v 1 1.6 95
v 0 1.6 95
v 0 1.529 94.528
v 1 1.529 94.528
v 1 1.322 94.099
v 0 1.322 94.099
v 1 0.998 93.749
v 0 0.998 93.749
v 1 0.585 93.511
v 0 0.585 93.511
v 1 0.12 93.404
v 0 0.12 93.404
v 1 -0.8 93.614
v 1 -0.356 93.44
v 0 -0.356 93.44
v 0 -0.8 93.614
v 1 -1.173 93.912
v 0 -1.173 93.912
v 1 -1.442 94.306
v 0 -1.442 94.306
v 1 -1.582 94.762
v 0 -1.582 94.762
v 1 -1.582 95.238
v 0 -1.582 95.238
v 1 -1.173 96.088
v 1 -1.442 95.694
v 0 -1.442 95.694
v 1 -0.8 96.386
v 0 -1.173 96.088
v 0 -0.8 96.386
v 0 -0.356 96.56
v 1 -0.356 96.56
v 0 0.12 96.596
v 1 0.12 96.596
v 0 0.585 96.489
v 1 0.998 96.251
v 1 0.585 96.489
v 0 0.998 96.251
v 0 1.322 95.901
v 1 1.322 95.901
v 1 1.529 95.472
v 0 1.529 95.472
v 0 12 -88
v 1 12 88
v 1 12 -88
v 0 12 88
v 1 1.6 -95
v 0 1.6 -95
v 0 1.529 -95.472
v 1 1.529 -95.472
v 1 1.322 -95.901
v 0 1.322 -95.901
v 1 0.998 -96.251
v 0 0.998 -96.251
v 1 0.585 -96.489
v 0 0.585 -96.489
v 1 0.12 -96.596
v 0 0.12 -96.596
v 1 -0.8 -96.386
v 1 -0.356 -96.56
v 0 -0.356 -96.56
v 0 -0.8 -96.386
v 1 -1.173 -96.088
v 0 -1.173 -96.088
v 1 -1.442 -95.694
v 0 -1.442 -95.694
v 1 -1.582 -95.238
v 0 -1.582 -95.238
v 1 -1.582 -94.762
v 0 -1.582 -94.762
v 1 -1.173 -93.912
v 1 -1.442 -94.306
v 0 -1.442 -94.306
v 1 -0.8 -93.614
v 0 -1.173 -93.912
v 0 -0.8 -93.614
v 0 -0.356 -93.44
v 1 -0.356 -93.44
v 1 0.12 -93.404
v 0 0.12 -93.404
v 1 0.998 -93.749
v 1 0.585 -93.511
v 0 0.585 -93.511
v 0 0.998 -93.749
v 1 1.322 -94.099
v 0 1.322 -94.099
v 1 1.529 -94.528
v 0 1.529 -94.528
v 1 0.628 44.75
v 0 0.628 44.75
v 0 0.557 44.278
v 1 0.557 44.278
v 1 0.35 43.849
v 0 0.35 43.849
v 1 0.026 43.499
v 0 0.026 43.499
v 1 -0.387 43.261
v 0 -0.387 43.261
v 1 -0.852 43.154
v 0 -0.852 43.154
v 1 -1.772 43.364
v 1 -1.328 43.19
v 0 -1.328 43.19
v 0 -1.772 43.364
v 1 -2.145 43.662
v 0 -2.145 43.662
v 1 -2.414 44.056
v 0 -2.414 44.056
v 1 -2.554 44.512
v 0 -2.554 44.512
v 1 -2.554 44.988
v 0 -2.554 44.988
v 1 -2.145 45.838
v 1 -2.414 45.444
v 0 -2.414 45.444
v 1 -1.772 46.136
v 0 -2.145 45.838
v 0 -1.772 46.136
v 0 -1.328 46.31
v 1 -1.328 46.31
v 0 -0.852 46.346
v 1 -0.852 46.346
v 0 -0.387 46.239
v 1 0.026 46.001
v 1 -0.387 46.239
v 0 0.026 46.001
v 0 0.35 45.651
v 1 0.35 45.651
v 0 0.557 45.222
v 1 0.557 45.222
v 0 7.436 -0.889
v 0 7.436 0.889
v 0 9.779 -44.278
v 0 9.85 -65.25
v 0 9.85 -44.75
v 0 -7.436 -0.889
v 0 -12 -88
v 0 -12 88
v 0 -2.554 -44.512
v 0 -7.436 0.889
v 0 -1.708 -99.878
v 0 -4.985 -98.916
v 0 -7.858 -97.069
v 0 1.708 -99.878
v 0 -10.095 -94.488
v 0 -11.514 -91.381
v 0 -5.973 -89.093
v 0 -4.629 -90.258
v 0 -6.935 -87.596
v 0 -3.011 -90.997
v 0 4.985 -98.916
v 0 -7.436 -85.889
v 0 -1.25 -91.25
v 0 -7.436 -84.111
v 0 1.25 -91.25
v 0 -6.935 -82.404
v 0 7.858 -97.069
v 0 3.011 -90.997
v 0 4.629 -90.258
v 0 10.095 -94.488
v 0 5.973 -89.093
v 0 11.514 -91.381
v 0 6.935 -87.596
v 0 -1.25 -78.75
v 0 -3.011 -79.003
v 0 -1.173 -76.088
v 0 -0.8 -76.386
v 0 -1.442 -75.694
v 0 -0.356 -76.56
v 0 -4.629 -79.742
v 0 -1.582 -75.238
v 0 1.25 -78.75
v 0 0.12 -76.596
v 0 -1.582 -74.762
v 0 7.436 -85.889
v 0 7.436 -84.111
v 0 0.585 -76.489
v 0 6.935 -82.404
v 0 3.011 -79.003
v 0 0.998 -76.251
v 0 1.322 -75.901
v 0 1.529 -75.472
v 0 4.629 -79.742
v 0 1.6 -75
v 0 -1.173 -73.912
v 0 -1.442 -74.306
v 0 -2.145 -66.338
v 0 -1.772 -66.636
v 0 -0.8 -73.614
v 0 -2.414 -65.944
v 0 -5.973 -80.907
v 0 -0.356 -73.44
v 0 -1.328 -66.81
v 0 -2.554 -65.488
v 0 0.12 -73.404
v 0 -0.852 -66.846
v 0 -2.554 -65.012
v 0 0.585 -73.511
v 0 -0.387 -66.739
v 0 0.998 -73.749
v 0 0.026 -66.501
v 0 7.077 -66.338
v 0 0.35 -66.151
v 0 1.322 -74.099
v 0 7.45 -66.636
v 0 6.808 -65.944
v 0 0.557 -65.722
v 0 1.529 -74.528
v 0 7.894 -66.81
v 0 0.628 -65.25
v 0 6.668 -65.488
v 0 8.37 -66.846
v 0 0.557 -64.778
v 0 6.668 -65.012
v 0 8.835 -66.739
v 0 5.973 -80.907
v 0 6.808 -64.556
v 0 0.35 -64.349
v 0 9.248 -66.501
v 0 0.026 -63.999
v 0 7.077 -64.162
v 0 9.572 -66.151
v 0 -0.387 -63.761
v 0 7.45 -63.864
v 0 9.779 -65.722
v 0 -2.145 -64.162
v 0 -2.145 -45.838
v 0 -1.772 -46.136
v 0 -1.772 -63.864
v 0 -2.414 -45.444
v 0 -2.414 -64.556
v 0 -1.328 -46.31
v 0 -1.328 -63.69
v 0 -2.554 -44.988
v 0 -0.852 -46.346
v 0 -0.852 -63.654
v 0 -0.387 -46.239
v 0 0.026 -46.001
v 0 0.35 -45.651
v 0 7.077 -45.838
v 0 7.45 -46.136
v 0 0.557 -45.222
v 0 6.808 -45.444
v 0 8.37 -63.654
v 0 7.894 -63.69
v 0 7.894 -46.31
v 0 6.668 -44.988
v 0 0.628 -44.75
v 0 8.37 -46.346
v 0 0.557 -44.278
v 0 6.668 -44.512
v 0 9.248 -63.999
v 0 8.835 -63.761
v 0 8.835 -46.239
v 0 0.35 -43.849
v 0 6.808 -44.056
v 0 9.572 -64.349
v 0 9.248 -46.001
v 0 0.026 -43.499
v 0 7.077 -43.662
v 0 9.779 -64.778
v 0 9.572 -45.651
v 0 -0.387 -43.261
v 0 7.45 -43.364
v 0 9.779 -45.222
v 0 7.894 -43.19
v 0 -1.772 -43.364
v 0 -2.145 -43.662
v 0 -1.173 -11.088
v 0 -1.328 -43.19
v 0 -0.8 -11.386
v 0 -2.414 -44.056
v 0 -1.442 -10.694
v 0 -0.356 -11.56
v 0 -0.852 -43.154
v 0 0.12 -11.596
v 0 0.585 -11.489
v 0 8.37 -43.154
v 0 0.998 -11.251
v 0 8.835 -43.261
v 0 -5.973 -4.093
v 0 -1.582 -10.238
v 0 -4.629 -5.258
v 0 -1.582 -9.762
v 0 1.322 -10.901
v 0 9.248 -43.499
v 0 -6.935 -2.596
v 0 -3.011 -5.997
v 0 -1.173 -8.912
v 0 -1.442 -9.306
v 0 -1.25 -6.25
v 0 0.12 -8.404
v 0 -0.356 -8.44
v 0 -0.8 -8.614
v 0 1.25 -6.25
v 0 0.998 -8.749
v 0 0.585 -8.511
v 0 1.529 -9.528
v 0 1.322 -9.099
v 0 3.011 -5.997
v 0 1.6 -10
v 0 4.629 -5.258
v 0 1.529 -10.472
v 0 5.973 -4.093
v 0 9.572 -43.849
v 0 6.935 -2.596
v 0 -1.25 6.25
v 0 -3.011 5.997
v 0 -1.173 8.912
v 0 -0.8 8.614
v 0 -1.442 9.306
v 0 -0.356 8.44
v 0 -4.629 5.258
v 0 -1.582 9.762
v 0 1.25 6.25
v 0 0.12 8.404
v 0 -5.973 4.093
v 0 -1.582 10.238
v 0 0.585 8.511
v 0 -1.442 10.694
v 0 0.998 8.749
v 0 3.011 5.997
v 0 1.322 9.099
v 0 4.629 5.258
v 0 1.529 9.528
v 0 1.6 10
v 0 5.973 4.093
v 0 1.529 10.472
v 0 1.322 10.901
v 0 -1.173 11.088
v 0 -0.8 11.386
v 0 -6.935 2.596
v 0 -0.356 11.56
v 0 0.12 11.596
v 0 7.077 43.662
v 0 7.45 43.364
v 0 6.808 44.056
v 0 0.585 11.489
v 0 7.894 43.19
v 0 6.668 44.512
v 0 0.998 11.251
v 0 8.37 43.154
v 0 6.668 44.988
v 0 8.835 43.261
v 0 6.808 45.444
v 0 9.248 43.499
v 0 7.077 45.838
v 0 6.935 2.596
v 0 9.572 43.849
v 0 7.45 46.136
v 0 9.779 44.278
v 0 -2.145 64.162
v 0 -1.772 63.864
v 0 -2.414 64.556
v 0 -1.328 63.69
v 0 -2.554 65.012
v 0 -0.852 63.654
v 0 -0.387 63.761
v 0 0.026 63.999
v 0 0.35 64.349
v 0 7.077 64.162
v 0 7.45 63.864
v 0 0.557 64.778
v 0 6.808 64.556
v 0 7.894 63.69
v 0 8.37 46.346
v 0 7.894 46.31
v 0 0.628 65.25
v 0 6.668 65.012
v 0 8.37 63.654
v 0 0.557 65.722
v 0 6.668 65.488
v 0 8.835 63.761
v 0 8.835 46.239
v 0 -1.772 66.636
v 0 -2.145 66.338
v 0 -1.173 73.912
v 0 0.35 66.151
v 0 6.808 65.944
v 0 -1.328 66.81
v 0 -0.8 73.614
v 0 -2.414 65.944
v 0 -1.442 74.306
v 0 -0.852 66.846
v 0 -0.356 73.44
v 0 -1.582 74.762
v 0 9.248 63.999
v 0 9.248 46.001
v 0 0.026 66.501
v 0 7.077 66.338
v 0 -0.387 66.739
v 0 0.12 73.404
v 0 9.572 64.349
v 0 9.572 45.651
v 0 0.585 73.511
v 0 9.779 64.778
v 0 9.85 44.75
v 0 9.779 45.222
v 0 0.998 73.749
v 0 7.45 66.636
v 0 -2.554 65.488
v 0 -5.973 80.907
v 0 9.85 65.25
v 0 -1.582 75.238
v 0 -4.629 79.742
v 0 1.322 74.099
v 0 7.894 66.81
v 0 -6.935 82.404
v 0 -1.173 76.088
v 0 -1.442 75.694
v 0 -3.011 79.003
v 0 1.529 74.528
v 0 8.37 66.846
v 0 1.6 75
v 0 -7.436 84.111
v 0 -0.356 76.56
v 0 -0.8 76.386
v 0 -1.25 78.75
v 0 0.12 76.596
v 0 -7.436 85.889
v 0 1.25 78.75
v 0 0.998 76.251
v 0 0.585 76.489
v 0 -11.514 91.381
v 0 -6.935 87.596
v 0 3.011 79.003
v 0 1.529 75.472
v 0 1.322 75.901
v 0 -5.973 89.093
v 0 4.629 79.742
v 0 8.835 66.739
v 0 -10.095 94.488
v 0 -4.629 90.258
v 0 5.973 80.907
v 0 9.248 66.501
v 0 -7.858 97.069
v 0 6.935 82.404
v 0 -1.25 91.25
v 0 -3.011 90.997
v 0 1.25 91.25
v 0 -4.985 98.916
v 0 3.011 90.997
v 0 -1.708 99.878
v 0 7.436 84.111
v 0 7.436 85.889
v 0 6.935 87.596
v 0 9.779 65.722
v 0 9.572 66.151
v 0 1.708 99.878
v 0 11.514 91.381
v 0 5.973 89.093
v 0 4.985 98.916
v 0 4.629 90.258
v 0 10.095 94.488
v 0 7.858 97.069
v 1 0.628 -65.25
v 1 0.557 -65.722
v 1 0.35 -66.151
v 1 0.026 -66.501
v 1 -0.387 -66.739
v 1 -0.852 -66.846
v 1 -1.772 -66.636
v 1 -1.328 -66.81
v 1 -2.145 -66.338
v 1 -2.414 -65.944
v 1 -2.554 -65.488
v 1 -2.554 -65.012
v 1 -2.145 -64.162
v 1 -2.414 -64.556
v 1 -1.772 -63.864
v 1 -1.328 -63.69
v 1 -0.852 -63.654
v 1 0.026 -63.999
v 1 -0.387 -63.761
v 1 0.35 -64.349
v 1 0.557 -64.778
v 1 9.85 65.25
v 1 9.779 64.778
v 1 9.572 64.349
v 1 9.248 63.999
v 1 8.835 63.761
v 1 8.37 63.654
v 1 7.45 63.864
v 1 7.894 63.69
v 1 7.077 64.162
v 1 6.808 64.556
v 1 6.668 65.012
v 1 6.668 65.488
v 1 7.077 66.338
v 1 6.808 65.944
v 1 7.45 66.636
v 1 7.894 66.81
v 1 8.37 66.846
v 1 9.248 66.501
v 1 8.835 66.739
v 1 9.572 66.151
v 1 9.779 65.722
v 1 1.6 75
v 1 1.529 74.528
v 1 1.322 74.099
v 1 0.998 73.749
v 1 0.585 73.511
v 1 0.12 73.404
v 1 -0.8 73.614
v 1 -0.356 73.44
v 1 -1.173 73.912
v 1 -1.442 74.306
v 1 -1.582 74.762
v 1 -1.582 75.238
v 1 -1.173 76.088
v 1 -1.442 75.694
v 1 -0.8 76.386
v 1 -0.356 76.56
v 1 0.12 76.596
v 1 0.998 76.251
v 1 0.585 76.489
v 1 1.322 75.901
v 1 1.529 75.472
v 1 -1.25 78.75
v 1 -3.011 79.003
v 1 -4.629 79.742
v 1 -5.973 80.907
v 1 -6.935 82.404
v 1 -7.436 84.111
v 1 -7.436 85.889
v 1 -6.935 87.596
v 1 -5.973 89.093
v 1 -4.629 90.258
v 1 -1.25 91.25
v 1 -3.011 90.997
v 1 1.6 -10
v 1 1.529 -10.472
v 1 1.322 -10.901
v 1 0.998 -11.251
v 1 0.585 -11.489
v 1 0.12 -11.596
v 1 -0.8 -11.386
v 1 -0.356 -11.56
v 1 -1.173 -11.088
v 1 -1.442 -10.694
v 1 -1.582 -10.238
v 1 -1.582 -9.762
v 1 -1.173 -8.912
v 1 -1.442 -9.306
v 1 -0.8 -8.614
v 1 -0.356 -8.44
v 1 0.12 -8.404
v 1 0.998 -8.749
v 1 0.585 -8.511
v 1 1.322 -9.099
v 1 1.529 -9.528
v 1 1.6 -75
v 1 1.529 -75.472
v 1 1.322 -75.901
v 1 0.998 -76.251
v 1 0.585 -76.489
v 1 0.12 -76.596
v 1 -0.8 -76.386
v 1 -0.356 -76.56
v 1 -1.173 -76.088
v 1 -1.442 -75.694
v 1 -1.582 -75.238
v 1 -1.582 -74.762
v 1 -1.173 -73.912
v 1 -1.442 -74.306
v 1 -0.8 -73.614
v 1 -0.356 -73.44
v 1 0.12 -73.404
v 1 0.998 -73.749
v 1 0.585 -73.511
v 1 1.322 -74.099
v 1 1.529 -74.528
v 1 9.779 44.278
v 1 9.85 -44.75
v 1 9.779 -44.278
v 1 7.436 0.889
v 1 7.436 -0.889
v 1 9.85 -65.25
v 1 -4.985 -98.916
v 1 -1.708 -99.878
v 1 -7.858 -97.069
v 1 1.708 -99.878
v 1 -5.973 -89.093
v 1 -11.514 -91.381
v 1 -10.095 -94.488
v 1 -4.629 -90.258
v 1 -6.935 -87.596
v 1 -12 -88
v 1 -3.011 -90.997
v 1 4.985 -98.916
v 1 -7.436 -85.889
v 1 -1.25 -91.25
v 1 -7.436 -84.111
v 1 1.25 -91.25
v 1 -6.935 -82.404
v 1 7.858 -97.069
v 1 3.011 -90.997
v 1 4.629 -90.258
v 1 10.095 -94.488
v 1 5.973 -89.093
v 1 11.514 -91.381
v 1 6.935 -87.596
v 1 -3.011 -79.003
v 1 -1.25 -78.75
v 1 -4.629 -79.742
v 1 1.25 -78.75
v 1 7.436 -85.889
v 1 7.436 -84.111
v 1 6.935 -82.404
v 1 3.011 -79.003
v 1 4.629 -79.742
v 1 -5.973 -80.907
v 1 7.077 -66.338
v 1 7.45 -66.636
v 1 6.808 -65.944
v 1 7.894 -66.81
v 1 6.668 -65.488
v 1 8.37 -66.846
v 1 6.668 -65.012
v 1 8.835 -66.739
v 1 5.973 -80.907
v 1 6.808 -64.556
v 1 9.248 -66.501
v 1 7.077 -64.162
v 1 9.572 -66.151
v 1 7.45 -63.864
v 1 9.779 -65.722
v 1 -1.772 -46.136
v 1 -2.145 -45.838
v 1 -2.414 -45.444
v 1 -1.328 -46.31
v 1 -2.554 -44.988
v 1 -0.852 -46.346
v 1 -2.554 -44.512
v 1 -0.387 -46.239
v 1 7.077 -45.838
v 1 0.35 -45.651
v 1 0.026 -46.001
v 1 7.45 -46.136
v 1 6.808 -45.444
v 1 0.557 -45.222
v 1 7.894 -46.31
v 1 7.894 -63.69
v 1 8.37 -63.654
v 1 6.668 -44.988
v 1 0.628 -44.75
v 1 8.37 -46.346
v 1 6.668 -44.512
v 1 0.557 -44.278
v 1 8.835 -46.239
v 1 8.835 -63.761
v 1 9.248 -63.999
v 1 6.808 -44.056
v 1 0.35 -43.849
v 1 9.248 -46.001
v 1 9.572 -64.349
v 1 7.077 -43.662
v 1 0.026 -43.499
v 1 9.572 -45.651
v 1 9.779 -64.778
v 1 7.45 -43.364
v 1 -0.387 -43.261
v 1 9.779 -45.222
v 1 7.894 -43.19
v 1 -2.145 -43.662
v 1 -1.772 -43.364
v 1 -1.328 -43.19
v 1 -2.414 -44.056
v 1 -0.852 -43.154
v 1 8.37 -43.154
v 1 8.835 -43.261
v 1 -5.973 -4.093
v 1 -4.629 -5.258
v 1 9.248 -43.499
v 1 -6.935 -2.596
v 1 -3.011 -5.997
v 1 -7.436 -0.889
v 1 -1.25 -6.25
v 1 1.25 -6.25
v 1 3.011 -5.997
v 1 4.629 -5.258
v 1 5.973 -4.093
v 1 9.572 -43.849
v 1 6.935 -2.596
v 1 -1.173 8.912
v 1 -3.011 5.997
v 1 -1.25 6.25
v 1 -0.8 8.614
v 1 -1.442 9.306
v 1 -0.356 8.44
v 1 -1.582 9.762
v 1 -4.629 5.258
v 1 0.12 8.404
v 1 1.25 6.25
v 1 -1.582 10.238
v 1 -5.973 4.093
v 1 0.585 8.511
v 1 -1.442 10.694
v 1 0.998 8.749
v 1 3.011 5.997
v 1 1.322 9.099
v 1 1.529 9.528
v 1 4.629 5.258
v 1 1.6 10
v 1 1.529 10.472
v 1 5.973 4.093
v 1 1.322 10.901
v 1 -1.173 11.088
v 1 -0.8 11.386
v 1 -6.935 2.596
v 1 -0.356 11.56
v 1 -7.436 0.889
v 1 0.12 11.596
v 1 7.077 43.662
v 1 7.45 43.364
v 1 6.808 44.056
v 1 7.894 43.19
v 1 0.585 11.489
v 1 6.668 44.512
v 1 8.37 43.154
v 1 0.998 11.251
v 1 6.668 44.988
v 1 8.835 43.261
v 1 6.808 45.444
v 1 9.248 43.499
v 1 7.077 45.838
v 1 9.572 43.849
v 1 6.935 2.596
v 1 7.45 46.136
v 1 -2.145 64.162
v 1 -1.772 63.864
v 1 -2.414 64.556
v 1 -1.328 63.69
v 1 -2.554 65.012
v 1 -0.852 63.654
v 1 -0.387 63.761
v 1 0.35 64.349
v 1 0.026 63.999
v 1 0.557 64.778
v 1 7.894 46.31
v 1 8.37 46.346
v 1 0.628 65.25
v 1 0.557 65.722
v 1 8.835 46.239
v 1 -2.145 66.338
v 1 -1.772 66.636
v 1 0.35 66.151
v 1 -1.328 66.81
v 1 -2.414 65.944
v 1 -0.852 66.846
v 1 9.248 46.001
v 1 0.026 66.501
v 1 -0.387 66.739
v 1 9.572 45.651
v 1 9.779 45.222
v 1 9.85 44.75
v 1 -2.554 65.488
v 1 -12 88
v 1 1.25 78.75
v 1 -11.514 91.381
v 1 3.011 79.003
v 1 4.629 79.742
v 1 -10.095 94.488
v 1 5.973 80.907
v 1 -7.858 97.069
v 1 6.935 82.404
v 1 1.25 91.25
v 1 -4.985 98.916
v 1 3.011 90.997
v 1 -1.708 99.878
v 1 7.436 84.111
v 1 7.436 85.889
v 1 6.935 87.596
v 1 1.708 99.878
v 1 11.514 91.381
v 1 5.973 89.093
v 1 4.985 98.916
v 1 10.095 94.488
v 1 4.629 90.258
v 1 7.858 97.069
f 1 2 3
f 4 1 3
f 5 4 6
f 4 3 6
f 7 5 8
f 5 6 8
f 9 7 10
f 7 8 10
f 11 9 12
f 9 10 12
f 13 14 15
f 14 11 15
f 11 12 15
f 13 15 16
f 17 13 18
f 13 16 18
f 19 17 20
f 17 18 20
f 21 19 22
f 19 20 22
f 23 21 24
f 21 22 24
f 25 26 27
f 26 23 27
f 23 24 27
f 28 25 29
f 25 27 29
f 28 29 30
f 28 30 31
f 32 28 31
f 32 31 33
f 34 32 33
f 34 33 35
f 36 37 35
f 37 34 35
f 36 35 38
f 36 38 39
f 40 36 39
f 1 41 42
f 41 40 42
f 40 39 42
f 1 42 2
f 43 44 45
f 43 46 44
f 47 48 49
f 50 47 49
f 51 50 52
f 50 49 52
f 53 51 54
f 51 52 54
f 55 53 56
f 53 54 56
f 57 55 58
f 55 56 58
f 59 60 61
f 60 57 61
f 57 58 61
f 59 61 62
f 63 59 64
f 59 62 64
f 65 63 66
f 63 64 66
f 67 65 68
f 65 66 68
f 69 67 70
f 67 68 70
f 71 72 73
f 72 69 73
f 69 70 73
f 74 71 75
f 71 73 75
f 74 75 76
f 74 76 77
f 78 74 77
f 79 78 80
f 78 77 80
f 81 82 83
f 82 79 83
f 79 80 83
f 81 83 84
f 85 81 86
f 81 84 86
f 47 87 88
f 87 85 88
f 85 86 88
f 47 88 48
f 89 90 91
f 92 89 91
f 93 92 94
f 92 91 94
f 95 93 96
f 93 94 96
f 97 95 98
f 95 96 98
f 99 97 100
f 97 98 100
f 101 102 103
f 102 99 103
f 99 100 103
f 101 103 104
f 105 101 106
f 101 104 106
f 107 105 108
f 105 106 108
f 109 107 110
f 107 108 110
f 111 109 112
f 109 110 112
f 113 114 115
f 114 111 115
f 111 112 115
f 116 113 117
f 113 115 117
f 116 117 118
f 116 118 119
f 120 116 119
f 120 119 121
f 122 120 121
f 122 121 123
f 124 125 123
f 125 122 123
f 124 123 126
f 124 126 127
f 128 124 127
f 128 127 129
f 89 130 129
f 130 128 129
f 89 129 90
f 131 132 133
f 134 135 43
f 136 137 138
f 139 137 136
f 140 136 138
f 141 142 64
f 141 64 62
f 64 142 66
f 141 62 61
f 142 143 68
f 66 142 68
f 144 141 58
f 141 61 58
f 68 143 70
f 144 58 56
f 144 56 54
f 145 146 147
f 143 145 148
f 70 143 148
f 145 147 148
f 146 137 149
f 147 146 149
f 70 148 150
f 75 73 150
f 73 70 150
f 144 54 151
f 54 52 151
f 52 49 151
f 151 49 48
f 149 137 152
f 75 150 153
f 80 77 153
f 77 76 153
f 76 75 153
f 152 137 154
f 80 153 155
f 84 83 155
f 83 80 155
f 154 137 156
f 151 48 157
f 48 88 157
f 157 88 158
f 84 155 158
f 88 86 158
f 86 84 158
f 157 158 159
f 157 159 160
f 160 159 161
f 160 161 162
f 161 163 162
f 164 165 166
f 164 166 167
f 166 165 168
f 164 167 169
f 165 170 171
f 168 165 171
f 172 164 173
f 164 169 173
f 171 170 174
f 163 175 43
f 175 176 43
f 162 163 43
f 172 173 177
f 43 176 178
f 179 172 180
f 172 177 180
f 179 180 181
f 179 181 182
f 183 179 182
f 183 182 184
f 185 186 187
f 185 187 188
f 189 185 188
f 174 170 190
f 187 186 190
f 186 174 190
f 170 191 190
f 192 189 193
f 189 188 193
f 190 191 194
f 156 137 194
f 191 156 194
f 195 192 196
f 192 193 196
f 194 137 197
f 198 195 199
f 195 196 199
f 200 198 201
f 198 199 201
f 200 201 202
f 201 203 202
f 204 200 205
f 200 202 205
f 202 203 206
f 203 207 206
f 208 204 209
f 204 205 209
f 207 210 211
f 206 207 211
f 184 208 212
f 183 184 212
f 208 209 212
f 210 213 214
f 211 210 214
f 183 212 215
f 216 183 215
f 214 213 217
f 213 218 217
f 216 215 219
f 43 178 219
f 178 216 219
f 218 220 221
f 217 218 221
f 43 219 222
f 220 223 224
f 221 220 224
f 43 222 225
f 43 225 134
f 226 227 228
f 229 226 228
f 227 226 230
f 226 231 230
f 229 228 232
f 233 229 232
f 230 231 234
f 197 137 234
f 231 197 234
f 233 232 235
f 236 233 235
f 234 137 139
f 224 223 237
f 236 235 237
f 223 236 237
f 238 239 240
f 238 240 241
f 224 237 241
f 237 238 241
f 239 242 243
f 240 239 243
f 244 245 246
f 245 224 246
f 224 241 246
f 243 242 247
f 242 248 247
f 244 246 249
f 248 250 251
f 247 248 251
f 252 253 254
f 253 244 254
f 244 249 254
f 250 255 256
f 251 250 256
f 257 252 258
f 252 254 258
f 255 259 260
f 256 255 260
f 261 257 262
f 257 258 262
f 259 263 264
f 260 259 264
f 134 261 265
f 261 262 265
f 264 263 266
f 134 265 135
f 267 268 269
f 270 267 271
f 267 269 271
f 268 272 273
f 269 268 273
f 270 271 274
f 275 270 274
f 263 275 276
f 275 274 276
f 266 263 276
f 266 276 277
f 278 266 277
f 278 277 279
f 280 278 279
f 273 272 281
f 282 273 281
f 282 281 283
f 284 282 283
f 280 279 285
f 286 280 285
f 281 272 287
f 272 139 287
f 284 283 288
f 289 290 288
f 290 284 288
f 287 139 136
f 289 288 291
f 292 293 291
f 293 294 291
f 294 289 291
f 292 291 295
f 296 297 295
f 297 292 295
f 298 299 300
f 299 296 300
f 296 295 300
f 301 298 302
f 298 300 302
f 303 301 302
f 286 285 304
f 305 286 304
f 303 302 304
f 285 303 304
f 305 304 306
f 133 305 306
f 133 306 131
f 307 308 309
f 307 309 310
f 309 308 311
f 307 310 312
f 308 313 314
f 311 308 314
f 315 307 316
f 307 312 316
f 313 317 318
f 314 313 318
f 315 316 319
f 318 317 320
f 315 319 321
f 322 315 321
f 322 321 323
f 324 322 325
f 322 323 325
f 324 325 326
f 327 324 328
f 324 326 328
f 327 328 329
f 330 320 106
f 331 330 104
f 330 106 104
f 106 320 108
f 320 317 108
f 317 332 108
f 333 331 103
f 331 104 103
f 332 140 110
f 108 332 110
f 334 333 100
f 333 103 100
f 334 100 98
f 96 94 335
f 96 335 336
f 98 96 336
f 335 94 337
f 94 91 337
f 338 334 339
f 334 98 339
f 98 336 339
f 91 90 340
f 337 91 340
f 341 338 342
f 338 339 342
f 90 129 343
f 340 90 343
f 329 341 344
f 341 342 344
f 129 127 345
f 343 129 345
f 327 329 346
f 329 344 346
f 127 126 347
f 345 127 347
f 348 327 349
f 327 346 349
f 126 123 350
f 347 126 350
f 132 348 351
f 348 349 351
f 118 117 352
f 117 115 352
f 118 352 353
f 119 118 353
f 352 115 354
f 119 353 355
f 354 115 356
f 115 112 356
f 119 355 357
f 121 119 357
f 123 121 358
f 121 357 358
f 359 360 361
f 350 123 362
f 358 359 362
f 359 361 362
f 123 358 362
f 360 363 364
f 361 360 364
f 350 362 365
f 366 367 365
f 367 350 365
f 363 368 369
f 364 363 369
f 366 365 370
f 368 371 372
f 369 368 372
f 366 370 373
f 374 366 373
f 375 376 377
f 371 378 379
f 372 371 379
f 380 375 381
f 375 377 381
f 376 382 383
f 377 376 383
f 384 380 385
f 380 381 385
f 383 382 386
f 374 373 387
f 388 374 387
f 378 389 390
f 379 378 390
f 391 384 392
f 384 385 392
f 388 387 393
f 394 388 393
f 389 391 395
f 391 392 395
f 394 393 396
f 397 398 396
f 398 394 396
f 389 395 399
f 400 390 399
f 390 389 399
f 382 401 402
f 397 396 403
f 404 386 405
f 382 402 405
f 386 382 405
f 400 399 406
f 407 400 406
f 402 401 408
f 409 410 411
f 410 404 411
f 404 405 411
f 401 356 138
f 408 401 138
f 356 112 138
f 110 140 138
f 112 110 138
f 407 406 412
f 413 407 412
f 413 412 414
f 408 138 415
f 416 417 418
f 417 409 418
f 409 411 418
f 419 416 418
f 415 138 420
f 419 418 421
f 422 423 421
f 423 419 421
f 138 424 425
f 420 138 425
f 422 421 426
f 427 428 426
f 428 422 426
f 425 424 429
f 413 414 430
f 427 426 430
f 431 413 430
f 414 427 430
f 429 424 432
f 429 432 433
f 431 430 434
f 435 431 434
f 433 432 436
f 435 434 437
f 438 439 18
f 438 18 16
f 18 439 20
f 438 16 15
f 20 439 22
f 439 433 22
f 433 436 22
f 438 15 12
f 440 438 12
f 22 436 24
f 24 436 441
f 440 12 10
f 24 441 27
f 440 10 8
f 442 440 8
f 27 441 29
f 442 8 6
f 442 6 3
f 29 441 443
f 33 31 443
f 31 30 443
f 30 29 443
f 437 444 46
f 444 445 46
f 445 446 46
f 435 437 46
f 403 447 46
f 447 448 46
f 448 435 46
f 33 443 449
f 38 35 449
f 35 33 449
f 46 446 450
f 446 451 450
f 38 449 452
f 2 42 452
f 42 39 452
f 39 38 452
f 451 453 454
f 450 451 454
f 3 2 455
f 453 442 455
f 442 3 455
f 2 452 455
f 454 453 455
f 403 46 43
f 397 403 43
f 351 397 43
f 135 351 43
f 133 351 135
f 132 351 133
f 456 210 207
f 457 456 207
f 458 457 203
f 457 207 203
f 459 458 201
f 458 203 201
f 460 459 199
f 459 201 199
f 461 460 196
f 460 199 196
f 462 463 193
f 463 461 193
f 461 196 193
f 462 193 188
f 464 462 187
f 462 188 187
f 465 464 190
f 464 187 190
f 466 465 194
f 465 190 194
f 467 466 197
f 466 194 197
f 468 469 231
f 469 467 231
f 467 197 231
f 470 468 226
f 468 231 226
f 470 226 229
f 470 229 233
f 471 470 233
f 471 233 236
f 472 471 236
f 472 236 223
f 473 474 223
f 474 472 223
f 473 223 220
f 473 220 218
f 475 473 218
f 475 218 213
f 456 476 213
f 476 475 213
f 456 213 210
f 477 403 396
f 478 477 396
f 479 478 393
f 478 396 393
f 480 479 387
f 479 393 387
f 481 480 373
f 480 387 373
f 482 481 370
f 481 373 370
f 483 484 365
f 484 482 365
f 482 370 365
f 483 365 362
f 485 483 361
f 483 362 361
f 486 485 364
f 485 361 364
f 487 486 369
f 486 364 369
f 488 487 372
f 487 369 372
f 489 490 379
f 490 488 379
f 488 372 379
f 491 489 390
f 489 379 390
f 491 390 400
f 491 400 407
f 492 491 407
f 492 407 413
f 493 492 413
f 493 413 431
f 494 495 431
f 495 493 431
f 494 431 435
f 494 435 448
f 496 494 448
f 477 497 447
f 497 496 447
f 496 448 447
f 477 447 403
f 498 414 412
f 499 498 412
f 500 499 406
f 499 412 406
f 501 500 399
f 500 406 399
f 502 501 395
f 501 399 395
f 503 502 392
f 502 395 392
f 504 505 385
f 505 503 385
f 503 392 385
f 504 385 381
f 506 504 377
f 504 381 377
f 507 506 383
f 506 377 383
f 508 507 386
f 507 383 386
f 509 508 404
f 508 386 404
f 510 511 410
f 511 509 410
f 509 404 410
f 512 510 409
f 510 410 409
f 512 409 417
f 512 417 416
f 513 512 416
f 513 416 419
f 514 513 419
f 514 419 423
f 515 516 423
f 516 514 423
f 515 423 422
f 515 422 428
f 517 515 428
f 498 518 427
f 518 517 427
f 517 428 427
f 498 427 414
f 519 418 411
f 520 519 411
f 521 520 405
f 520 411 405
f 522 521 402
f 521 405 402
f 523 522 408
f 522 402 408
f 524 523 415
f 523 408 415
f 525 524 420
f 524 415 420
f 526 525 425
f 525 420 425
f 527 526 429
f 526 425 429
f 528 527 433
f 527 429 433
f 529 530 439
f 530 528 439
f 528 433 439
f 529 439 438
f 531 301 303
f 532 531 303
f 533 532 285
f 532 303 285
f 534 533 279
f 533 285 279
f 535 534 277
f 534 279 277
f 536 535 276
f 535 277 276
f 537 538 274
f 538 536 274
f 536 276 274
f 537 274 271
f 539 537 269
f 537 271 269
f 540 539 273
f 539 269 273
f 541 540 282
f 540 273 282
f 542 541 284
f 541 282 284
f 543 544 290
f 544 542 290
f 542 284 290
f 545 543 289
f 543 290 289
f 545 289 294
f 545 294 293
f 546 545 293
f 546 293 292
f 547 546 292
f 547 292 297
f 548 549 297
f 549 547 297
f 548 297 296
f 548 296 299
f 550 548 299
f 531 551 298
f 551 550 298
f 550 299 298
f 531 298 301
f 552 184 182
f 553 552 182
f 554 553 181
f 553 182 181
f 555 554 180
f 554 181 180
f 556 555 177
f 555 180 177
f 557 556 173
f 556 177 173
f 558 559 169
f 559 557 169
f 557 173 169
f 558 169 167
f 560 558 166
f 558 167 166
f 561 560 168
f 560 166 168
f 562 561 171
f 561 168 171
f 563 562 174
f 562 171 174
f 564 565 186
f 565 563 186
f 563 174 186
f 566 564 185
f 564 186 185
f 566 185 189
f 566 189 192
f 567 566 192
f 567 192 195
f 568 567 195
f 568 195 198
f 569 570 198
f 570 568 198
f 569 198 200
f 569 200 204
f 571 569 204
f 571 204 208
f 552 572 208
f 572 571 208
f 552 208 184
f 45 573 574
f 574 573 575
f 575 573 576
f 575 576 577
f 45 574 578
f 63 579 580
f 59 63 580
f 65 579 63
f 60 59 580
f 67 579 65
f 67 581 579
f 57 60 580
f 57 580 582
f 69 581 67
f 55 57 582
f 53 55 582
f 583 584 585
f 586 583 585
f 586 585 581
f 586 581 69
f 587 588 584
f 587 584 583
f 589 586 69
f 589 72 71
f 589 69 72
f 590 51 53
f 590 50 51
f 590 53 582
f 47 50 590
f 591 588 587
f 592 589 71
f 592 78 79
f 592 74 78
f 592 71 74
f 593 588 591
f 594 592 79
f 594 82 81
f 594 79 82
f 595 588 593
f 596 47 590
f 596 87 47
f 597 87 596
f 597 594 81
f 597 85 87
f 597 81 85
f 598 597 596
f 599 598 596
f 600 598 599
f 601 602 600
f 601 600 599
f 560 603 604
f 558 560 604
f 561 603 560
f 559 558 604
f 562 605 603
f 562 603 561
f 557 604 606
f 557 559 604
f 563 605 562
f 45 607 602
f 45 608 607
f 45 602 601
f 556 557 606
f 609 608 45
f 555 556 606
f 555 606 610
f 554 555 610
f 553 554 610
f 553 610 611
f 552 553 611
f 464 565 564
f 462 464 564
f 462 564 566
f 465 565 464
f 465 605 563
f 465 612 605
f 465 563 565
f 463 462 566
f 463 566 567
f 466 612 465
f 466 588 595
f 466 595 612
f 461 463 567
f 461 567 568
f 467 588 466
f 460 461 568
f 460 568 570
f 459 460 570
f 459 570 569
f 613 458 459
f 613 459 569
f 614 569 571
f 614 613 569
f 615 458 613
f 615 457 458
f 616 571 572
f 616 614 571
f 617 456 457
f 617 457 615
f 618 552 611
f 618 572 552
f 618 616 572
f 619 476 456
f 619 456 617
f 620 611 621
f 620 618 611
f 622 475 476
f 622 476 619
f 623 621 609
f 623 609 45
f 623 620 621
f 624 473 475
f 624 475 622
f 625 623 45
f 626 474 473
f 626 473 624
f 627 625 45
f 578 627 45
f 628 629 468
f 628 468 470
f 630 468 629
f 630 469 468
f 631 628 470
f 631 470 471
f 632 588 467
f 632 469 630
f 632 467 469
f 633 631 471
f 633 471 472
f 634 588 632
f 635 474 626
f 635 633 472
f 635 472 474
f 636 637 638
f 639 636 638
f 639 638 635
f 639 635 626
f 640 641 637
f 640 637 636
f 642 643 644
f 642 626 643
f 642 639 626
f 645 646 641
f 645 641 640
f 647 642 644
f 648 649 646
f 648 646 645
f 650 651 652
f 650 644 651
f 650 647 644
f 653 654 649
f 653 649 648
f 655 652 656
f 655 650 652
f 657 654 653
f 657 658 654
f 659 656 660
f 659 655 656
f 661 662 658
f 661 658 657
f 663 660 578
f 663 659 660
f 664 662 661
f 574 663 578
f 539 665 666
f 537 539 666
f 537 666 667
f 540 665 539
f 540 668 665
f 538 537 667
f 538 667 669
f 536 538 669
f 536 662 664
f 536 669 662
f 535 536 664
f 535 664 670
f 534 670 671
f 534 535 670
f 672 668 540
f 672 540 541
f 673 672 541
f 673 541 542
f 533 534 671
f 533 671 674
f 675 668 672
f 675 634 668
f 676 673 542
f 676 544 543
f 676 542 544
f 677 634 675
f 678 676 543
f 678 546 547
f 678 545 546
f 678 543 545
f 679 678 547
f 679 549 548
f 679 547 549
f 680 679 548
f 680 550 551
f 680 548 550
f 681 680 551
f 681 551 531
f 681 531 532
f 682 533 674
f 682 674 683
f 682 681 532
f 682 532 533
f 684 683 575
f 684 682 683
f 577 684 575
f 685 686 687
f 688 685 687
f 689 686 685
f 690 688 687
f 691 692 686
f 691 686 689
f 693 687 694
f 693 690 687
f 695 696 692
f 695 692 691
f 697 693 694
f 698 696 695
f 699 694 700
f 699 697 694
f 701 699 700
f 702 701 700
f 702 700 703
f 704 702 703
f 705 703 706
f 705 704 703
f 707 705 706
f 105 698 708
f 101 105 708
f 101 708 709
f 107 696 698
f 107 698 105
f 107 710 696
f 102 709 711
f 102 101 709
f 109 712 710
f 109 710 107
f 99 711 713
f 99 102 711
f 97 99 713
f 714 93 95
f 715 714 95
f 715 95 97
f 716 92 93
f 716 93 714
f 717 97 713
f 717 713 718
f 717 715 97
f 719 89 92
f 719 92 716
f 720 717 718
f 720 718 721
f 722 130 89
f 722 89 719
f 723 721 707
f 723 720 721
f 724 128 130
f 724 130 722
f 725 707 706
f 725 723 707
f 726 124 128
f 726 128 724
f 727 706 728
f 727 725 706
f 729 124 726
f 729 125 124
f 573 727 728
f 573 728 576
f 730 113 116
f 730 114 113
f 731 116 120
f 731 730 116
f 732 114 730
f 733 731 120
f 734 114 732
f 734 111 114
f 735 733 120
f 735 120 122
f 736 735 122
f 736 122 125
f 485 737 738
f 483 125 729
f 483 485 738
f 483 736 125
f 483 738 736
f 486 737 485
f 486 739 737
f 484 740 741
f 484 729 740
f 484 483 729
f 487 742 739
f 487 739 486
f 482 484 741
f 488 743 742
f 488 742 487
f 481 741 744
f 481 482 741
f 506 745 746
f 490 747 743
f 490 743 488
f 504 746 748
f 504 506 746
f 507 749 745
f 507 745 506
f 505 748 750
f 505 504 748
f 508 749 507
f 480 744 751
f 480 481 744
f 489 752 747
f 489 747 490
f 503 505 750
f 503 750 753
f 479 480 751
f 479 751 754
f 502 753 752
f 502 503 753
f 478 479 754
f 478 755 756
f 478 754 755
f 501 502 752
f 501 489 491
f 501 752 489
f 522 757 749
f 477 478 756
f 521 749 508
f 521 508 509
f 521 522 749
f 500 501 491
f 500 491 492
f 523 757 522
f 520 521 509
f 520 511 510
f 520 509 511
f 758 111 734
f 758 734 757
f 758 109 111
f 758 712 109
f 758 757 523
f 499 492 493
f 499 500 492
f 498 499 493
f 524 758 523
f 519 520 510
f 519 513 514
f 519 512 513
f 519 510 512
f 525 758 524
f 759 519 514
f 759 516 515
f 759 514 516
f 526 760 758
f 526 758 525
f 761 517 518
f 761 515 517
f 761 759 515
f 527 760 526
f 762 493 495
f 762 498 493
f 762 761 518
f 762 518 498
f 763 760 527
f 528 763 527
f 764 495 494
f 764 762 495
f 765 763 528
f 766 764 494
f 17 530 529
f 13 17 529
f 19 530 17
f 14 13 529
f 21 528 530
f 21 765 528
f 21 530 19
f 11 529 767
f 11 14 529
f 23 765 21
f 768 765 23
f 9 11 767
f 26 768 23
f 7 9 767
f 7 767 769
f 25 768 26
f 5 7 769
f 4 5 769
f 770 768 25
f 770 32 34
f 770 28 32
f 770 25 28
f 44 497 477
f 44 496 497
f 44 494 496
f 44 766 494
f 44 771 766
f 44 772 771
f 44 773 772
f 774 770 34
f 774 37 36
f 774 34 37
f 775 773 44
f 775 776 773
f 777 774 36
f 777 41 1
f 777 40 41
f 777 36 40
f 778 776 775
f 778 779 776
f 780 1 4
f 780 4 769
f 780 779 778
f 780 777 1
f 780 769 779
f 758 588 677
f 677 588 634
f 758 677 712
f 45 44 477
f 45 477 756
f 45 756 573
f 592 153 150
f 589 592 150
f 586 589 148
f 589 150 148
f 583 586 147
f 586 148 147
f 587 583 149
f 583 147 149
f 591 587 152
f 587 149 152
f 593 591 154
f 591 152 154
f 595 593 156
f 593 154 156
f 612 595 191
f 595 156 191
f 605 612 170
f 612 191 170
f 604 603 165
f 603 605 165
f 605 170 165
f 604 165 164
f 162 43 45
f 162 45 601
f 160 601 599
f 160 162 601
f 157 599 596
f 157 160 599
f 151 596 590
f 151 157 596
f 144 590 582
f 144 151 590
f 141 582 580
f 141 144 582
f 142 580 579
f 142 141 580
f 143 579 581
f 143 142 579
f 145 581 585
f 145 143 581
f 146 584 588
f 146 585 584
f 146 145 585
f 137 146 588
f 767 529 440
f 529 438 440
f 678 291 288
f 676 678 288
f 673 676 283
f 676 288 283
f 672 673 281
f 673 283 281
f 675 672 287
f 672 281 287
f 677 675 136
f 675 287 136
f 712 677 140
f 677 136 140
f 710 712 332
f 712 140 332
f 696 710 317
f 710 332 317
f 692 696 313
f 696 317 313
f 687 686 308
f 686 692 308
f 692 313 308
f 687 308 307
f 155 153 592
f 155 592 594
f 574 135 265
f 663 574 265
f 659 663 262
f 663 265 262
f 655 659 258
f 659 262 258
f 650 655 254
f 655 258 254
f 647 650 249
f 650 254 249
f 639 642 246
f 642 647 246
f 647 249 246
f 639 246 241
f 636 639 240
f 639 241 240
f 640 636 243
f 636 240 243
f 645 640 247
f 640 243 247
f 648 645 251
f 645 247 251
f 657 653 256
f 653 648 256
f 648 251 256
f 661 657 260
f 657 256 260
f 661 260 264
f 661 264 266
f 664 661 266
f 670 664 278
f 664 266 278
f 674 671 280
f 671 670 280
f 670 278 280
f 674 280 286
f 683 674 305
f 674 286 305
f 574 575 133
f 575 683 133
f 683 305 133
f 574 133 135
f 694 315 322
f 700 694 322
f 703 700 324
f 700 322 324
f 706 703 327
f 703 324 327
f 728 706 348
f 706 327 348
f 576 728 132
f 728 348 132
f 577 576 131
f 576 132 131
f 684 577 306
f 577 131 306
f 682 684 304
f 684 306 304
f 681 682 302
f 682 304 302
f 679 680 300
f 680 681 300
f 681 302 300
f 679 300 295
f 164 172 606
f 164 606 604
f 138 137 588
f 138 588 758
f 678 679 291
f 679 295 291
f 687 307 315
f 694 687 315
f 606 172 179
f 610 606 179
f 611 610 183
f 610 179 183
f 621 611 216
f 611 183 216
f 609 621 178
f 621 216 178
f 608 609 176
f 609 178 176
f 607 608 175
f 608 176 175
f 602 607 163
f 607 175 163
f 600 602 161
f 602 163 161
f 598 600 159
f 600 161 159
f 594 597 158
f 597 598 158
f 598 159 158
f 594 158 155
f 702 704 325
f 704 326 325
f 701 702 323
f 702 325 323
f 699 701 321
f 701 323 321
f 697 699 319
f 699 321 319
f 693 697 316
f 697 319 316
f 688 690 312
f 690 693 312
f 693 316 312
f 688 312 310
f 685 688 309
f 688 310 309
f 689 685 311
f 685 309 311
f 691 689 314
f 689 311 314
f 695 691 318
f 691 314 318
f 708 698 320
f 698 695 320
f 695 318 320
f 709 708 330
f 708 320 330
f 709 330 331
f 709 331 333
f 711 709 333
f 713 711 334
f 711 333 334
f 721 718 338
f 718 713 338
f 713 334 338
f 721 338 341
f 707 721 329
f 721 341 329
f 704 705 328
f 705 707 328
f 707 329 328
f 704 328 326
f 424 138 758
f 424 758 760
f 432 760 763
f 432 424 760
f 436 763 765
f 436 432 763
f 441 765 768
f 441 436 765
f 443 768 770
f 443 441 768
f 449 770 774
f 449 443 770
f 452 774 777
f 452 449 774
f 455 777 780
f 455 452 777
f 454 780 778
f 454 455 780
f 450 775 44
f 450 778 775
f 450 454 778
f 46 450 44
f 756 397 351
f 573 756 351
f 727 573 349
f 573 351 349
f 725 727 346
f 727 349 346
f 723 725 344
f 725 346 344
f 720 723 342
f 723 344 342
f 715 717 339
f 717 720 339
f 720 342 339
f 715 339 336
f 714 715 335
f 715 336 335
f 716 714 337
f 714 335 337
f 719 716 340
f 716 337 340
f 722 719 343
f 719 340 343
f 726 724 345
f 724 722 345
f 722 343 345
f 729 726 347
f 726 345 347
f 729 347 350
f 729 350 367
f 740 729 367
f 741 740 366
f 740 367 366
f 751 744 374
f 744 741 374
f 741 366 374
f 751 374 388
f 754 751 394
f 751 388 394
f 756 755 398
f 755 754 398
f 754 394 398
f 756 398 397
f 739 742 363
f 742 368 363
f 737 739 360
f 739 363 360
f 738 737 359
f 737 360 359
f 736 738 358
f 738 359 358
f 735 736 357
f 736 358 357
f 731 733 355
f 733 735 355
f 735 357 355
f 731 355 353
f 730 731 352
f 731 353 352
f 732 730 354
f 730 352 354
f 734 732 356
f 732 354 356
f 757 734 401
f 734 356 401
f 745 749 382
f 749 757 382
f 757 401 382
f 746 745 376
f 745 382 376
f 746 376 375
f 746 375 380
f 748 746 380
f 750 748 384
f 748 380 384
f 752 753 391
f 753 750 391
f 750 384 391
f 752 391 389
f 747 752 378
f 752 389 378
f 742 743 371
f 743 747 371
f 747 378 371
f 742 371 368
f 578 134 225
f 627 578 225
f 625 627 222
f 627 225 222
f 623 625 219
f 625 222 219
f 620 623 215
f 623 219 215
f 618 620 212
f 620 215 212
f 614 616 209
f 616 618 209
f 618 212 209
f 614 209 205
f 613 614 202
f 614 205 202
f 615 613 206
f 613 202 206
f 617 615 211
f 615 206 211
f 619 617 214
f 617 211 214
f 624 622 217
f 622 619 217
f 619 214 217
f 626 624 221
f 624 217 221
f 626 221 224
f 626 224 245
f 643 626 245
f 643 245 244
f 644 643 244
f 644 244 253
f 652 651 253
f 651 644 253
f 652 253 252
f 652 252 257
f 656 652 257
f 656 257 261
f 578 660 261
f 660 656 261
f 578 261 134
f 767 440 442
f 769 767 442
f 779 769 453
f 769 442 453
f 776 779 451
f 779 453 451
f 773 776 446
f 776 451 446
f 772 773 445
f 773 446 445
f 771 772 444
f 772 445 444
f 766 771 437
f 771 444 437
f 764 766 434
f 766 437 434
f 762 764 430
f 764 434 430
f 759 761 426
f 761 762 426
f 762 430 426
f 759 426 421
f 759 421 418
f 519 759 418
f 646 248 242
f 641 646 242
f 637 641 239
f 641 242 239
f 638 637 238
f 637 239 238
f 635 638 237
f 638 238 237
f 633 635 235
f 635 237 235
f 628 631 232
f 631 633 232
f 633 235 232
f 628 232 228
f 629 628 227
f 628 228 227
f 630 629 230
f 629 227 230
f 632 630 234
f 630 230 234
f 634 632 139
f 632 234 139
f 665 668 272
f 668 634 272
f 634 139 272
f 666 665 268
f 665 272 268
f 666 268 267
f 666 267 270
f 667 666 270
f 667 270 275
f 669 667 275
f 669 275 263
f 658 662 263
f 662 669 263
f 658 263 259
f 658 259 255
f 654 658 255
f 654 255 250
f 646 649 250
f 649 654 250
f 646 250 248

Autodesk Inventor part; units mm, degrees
ref_plane "YZ Plane" through (0, 0, 0) normal (1, 0, 0) x (0, 1, 0)
ref_plane "XZ Plane" through (0, 0, 0) normal (0, 1, 0) x (-1, 0, 0)
ref_plane "XY Plane" through (0, 0, 0) normal (0, 0, 1) x (1, 0, 0)
sketch "Sketch1" plane through (0, 0, 0) normal (1, 0, 0) x (0, 1, 0)
  line L0 (-1.25, 6.25) -> (1.25, 6.25)
  arc A0 (1.25, -6.25) -> (1.25, 6.25) centre (1.25, 0) ccw
  line L1 (1.25, -6.25) -> (-1.25, -6.25)
  arc A1 (-1.25, 6.25) -> (-1.25, -6.25) centre (-1.25, 0) ccw
  circle A2 centre (0, -10) radius 1.6
  circle A3 centre (0, 10) radius 1.6
  circle A4 centre (8.25, 44.75) radius 1.6
  circle A5 centre (8.25, 65.25) radius 1.6
  line L2 (-1.25, 91.25) -> (1.25, 91.25)
  arc A6 (1.25, 78.75) -> (1.25, 91.25) centre (1.25, 85) ccw
  line L3 (1.25, 78.75) -> (-1.25, 78.75)
  arc A7 (-1.25, 91.25) -> (-1.25, 78.75) centre (-1.25, 85) ccw
  circle A8 centre (0, 75) radius 1.6
  circle A9 centre (0, 95) radius 1.6
  line L4 (-1.25, -91.25) -> (1.25, -91.25)
  arc A10 (1.25, -91.25) -> (1.25, -78.75) centre (1.25, -85) ccw
  line L5 (1.25, -78.75) -> (-1.25, -78.75)
  arc A11 (-1.25, -78.75) -> (-1.25, -91.25) centre (-1.25, -85) ccw
  circle A12 centre (0, -75) radius 1.6
  circle A13 centre (0, -95) radius 1.6
  circle A14 centre (-0.972, 44.75) radius 1.6
  circle A15 centre (-0.972, 65.25) radius 1.6
  circle A16 centre (8.25, -44.75) radius 1.6
  circle A17 centre (8.25, -65.25) radius 1.6
  circle A18 centre (-0.972, -44.75) radius 1.6
  circle A19 centre (-0.972, -65.25) radius 1.6
  arc A20 (12, 88) -> (-12, 88) centre (0, 88) ccw
  line L6 (12, 88) -> (12, -88)
  arc A21 (-12, -88) -> (12, -88) centre (0, -88) ccw
  line L7 (-12, -88) -> (-12, 88)
  point P0 (0, 0)
  point P1 (0, 0)
  point P2 (-12, -88)
  point P3 (12, 88)
  point P4 (-12, 88)
  point P5 (1.25, -78.75)
  point P6 (1.25, 78.75)
  point P7 (-1.25, 78.75)
  point P8 (1.25, -6.25)
  point P9 (-1.25, -6.25)
  dimension "d2" = 3.2
  dimension "d3" = 3.2
  dimension "d4" = 3.2
  dimension "d5" = 3.2
  dimension "d6" = 9.222
  dimension "d7" = 9.222
  dimension "d8" = 9.222
  dimension "d9" = 3.2
  dimension "d10" = 3.2
  dimension "d11" = 3.2
  dimension "d12" = 3.2
  dimension "d15" = 3.2
  dimension "d16" = 3.2
  dimension "d17" = 3.2
  dimension "d18" = 3.2
  dimension "d19" = 3.2
  dimension "d20" = 3.2
extrude "Extrusion1" add sketch "Sketch1" along normal blind 1
equation "\"d2\" = d5"
equation "\"d3\" = d5"
equation "\"d4\" = d5"
equation "\"d7\" = d6"
equation "\"d8\" = d6"
equation "\"d9\" = d5"
equation "\"d10\" = d5"
equation "\"d11\" = d5"
equation "\"d12\" = d5"
equation "\"d15\" = d5"
equation "\"d16\" = d5"
equation "\"d17\" = d5"
equation "\"d18\" = d5"
equation "\"d19\" = d5"
equation "\"d20\" = d5"
properties part number "Leg_Loadpipe_Plate_Outer" material "CFRP"
